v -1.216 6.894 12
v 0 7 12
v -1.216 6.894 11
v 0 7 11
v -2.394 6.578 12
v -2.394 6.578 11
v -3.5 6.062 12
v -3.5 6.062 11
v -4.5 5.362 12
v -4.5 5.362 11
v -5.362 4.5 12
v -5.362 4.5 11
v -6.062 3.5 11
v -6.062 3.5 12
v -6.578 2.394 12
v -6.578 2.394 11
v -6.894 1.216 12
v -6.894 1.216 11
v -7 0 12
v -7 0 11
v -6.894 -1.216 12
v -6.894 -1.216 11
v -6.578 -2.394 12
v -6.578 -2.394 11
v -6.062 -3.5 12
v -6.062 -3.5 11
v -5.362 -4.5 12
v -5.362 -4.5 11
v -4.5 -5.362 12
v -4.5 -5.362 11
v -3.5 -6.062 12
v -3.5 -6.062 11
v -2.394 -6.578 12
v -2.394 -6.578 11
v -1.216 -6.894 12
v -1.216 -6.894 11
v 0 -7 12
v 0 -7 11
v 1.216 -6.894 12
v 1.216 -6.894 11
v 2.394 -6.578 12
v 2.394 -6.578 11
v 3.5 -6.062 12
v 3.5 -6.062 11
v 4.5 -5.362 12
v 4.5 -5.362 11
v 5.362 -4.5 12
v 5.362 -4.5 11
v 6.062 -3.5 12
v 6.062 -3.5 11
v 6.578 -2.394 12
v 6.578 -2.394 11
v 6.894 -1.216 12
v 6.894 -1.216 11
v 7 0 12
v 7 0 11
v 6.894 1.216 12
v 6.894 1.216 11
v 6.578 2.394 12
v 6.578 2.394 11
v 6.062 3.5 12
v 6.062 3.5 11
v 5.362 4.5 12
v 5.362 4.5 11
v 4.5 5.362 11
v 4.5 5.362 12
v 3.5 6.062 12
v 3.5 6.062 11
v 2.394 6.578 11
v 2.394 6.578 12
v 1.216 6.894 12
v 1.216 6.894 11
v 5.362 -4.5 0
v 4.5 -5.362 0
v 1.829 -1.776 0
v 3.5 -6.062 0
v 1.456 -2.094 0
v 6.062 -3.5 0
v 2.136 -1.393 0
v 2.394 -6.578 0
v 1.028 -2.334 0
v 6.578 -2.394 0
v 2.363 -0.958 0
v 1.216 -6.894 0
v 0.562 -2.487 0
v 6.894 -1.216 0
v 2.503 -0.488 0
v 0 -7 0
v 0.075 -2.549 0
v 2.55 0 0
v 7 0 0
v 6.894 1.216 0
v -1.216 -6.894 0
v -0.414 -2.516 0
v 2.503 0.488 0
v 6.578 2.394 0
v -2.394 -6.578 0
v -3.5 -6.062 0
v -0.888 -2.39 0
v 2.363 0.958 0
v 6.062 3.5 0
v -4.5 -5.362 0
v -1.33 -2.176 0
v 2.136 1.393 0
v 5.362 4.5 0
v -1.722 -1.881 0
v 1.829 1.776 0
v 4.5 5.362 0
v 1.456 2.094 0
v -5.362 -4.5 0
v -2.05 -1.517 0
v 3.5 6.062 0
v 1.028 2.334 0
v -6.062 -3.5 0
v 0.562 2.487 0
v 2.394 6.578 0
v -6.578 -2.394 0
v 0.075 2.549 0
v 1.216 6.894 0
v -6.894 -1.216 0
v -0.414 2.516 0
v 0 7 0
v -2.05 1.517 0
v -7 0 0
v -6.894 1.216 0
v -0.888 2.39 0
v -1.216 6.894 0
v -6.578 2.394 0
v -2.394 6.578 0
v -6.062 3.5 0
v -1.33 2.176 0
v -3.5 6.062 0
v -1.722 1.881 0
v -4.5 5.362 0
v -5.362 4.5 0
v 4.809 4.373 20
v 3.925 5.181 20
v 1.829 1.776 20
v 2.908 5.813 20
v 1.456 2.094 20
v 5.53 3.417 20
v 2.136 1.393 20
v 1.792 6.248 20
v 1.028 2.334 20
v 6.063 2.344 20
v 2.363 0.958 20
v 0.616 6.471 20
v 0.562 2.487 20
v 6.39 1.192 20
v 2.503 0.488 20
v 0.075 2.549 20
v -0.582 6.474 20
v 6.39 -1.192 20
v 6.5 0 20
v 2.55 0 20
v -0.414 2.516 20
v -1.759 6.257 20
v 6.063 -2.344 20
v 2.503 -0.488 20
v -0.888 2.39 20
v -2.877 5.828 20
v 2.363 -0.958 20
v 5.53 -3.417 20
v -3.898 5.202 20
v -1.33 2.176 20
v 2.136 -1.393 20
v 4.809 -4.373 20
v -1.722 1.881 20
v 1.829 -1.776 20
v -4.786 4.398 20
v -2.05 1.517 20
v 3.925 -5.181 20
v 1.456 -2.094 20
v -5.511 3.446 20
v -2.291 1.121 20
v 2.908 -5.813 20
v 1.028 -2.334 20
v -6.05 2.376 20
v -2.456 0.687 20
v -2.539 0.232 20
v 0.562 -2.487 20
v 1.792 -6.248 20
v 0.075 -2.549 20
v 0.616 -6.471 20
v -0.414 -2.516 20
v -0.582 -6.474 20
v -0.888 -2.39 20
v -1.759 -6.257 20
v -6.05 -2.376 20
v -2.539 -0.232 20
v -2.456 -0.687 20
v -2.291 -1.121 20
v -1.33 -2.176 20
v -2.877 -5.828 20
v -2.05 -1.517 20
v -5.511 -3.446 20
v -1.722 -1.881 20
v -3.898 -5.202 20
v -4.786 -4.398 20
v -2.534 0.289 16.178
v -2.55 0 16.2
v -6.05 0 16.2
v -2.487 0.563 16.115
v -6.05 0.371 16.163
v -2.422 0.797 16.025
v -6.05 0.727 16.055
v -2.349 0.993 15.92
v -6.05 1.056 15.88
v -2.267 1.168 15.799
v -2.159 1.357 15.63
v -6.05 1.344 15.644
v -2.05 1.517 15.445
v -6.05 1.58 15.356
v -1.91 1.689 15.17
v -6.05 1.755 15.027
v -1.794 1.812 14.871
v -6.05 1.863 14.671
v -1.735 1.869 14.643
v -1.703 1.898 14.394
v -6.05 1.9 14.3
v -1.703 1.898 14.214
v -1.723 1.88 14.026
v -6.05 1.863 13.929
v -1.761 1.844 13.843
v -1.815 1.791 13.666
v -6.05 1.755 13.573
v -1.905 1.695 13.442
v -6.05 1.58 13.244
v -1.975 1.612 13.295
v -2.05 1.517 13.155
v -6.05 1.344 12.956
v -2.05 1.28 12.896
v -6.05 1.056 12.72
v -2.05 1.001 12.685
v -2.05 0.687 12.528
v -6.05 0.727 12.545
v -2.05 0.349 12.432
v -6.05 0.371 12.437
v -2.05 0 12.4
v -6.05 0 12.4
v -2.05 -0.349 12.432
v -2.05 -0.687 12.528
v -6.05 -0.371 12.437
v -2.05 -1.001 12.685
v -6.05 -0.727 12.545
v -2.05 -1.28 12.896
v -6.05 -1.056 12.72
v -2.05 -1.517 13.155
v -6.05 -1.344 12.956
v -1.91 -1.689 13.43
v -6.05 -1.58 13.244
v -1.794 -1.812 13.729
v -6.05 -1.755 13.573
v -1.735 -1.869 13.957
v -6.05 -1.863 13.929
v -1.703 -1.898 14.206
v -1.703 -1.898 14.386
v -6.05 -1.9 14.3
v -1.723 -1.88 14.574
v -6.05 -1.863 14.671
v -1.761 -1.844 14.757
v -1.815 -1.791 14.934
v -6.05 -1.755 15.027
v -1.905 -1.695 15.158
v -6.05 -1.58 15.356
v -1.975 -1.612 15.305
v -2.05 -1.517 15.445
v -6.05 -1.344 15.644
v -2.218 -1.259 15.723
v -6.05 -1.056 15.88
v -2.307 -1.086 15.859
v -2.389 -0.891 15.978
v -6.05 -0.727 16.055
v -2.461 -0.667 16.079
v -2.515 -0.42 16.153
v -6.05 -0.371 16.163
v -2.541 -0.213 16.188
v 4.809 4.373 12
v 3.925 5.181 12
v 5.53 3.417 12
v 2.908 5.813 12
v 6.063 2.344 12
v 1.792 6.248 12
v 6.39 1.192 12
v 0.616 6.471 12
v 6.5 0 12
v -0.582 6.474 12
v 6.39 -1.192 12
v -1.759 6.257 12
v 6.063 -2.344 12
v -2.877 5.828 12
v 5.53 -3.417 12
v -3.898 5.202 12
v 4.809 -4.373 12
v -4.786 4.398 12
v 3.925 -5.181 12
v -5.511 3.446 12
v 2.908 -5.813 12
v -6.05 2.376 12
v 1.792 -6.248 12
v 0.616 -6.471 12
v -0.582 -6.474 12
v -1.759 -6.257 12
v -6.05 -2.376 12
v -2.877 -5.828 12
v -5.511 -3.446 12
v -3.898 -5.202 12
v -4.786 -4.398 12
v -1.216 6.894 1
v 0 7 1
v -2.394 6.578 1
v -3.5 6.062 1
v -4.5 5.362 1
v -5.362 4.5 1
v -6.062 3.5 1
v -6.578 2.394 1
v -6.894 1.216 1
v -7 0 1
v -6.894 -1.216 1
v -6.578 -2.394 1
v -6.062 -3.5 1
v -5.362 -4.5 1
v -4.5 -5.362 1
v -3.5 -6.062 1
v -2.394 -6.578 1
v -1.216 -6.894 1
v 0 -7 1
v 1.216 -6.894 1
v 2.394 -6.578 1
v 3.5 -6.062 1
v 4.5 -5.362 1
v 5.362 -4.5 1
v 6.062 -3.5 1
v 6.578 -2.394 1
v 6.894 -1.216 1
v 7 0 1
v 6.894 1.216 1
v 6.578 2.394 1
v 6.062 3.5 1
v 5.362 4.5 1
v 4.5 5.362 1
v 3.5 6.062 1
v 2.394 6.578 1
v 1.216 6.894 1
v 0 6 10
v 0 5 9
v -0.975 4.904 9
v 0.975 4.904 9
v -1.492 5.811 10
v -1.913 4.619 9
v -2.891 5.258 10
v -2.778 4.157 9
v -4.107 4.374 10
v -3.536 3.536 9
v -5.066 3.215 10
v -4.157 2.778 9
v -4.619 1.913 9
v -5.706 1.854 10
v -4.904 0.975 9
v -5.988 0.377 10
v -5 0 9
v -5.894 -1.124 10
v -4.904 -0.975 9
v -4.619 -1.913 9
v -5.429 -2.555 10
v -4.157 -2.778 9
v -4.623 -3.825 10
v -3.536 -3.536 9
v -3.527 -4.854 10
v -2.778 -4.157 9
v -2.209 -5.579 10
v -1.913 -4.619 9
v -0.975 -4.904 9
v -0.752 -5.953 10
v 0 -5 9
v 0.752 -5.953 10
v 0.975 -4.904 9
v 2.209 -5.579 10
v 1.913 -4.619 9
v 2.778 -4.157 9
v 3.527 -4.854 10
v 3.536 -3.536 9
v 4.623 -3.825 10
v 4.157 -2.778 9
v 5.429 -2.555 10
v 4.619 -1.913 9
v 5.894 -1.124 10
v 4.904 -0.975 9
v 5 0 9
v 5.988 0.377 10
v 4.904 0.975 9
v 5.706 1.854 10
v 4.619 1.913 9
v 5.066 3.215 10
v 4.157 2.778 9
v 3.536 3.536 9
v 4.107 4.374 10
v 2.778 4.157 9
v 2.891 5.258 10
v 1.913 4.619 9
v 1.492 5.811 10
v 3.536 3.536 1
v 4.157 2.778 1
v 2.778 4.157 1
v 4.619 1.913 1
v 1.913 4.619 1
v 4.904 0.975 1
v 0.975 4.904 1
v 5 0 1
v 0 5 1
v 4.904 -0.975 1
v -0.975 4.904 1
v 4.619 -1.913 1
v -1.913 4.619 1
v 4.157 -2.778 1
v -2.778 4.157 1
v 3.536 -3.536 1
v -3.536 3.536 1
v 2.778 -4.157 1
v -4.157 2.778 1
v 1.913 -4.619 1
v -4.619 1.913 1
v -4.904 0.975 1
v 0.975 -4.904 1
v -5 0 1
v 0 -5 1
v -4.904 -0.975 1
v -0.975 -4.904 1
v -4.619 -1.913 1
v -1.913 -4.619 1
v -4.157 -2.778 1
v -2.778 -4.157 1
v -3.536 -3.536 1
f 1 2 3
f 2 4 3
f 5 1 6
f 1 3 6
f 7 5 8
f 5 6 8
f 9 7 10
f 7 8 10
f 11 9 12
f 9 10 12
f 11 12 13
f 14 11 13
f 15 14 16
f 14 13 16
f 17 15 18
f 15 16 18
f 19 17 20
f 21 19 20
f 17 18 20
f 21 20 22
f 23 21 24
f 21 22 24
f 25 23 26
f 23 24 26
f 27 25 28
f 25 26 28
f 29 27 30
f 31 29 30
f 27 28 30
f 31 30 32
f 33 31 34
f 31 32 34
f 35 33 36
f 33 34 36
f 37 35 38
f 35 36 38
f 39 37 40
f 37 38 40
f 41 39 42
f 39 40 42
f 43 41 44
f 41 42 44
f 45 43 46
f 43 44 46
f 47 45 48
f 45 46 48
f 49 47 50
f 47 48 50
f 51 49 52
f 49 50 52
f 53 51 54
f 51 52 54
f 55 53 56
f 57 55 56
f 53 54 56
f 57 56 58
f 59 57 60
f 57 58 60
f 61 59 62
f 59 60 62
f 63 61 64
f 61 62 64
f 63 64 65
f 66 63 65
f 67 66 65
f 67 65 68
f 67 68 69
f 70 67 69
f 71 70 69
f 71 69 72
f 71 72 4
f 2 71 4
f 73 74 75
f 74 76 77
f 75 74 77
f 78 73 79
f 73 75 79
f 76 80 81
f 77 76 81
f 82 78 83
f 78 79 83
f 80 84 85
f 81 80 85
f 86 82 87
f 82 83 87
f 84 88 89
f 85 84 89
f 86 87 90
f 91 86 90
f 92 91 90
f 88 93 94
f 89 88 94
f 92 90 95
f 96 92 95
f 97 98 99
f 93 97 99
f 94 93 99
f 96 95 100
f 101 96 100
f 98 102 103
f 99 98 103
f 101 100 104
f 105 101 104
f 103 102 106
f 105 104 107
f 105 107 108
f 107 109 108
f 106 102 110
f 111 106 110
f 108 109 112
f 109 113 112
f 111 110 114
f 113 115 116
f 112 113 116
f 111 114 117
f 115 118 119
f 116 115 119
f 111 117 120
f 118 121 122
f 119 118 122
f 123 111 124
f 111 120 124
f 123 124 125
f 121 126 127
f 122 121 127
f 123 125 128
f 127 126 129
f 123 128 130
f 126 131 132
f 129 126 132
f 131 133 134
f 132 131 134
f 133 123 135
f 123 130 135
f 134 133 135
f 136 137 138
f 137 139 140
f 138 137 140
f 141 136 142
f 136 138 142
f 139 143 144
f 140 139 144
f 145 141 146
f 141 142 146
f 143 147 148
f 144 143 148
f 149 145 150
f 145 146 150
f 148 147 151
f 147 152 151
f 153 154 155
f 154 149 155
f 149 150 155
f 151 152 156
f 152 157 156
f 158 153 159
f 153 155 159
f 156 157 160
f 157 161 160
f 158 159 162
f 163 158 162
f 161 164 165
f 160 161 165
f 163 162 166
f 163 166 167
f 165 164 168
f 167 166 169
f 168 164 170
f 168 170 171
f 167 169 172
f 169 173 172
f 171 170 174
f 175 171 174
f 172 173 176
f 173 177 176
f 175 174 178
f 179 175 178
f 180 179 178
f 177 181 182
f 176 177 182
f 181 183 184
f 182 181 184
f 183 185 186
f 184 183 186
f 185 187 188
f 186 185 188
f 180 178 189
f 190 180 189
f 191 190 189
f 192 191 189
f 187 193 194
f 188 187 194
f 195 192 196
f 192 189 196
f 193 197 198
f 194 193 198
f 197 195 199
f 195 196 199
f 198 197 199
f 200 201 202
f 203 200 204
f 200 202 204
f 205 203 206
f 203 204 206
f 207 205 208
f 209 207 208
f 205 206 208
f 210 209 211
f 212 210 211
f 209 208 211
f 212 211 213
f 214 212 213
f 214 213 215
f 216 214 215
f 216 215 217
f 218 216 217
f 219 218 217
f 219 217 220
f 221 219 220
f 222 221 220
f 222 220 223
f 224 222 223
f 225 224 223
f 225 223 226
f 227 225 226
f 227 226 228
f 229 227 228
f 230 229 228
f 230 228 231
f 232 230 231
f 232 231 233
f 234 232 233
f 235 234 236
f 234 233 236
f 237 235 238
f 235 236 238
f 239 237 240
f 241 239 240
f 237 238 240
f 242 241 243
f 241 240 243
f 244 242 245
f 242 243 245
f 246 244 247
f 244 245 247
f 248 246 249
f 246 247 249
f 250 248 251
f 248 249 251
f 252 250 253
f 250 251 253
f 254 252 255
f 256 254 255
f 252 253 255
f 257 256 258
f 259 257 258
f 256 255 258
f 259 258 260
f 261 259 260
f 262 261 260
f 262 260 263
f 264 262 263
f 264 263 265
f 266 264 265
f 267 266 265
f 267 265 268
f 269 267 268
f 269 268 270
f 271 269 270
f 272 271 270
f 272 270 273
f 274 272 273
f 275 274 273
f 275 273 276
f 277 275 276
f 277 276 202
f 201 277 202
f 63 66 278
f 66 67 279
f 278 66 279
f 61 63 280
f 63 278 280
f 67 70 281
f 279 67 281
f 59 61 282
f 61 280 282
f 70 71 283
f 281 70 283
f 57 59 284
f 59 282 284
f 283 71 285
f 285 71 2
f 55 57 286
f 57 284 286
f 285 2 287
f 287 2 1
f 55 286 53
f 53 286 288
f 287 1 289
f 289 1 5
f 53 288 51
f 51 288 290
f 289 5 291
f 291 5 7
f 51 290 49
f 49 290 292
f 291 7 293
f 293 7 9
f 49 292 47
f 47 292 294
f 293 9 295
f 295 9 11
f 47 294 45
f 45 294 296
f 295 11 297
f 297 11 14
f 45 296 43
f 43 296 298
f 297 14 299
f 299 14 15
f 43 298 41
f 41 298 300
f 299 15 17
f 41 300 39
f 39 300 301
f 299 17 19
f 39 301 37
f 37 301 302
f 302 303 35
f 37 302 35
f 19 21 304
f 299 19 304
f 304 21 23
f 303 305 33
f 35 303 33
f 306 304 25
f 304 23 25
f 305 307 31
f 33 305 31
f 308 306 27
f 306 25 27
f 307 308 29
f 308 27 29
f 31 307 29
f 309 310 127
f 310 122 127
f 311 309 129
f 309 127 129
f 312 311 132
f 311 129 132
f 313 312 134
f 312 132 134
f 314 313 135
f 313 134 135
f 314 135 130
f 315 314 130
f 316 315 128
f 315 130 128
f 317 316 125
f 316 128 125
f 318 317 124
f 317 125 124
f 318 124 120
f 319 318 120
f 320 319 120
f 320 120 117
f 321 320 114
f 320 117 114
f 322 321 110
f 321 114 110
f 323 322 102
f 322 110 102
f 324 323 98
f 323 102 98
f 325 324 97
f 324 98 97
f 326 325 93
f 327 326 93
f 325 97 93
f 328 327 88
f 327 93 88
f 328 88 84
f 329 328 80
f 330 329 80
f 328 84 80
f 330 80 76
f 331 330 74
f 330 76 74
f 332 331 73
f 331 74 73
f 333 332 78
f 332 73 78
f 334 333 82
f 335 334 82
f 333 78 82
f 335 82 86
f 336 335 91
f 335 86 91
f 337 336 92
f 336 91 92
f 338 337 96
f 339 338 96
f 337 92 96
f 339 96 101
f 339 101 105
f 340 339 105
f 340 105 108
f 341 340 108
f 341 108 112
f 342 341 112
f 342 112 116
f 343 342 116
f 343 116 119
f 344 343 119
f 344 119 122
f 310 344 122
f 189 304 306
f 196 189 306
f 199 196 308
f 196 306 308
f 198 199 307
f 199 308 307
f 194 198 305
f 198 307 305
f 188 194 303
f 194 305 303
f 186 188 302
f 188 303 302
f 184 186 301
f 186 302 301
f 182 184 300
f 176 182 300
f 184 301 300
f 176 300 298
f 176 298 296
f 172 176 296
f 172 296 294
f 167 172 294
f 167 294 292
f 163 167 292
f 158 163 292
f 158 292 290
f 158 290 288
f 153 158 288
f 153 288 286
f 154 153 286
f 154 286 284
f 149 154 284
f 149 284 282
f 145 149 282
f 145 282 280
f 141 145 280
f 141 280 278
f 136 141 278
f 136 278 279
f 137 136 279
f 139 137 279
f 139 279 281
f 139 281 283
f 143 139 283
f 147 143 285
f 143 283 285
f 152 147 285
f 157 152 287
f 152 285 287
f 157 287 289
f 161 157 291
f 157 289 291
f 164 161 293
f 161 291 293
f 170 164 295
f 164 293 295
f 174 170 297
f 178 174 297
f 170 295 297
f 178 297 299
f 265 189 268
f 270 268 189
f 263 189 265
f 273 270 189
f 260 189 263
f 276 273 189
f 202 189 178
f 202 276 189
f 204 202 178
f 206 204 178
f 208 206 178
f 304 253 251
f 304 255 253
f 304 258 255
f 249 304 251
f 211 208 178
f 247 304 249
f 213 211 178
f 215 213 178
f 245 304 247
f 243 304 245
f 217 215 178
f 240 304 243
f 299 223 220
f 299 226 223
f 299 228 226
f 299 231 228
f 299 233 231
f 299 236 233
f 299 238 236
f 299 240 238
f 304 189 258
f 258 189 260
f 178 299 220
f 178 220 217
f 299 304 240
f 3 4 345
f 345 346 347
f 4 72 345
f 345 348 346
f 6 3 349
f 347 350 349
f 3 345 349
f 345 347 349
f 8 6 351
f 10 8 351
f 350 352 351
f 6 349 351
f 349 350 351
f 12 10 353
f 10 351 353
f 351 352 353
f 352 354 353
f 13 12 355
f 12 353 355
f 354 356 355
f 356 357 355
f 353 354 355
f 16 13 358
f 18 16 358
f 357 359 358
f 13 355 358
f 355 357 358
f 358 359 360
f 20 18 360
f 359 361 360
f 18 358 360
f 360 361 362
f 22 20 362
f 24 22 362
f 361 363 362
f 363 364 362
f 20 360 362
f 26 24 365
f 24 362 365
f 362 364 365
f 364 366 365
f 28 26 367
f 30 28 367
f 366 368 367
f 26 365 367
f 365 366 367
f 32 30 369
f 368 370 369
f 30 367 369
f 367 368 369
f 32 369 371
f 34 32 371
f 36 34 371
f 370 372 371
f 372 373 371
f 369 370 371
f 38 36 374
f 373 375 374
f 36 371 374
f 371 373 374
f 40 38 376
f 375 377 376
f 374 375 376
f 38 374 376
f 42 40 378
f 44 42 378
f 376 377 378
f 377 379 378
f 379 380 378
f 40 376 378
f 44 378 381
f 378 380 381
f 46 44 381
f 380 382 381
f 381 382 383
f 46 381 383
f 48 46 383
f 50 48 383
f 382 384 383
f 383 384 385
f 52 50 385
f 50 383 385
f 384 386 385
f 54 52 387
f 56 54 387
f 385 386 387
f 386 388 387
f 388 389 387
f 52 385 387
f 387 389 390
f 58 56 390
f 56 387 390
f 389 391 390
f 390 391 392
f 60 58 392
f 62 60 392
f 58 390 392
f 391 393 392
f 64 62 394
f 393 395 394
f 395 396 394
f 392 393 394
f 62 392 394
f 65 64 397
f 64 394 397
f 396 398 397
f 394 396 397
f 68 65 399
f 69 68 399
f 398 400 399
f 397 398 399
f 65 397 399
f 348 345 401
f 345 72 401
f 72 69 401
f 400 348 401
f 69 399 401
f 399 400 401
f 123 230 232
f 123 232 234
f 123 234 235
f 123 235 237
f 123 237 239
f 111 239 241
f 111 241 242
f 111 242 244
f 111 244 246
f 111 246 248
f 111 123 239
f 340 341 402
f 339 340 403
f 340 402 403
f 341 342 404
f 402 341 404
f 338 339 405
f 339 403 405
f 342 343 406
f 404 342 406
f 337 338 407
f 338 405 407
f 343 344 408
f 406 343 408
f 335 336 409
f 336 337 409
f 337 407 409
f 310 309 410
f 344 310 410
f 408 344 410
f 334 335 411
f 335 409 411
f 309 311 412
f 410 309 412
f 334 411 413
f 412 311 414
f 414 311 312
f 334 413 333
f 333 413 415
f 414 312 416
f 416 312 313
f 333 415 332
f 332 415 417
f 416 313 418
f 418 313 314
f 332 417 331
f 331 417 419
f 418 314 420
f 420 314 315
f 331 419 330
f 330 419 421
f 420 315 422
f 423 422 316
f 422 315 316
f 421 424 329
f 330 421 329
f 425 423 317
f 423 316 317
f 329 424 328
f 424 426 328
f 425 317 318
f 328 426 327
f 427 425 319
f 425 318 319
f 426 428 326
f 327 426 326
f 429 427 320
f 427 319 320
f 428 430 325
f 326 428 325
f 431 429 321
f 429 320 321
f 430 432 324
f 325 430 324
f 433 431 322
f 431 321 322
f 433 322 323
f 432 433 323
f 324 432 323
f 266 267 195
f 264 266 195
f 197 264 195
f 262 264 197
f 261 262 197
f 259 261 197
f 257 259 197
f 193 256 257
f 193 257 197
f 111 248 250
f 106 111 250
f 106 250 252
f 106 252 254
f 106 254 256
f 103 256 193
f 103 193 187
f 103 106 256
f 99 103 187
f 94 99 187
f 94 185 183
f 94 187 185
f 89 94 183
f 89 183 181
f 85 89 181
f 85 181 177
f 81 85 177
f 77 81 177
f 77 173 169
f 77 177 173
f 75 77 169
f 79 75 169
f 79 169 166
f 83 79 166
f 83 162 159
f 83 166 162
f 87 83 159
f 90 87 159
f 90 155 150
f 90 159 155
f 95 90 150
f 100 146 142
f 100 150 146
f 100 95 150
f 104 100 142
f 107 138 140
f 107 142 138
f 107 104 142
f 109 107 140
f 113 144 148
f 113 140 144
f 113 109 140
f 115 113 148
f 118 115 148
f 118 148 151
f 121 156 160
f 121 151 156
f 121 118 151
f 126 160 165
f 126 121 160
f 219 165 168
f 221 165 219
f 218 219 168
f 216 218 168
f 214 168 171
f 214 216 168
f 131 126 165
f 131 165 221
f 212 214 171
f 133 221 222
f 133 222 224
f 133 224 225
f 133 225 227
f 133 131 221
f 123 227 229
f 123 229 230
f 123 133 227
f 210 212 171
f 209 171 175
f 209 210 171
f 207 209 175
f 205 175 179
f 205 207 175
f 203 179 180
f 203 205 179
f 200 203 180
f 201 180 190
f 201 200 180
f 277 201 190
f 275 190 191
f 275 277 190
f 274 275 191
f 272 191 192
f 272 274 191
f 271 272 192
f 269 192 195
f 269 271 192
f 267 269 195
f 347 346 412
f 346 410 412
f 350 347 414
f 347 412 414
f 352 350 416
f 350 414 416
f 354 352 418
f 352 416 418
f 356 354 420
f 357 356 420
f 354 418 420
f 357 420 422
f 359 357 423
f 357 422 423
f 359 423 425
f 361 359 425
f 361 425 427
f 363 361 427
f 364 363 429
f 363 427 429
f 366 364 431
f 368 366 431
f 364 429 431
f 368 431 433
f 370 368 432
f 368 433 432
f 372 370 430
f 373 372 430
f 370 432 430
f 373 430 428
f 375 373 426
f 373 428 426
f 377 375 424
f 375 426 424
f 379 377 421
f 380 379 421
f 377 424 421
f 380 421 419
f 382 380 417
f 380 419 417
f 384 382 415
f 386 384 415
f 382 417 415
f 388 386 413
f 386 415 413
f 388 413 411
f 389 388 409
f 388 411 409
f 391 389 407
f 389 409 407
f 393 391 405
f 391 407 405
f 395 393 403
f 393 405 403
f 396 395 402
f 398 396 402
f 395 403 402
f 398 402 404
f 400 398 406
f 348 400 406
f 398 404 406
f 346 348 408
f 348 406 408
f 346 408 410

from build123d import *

# Parameters (mm, degrees)
CUT_EXTRUDE1_DEPTH      = 23.315913604
CUT_EXTRUDE1_DEPTH_BACK = 23.315913604
CUT_EXTRUDE2_START      = -8
CUT_EXTRUDE2_DEPTH      = 8
CUT_EXTRUDE3_REACH      = 26.886
SKETCH4_R               = 1.9
CUT_EXTRUDE4_START      = -5.7
SKETCH5_R               = 2.55
CUT_EXTRUDE4_DEPTH      = 5.7


with BuildPart() as part:
    # Sketch2 → Revolve1 (revolve)
    with BuildSketch(Plane(origin=(0, 0, 0), x_dir=(0, 0, -1), z_dir=(1, 0, 0))):
        Polygon((0, 0), (-20, 0), (-20, 6.5), (-12, 6.5), (-12, 7), (-11, 7), (-9, 5), (-1, 5), (-1, 7), (0, 7), align=None)
    revolve(axis=Axis((0, 0, 0), (0, 0, 1)))

    # Sketch1 → Cut-Extrude1 (cut, two sides: drawn at the far end of the back side and taken through both)
    with BuildSketch(Plane.XY.offset(-CUT_EXTRUDE1_DEPTH_BACK)):
        with BuildLine():
            Line((-2.05, 1.516575089), (-2.05, -1.516575089))
            ThreePointArc((-2.05, -1.516575089), (2.55, 0), (-2.05, 1.516575089))
        make_face()
    extrude(amount=CUT_EXTRUDE1_DEPTH + CUT_EXTRUDE1_DEPTH_BACK, mode=Mode.SUBTRACT)

    # Sketch3 → Cut-Extrude2 (cut)
    with BuildSketch(Plane.XY.offset(20).offset(CUT_EXTRUDE2_START)):
        with BuildLine():
            Line((-6.05, -2.376446928), (-6.05, 2.376446928))
            ThreePointArc((-6.05, 2.376446928), (-6.5, 0), (-6.05, -2.376446928))
        make_face()
    extrude(amount=CUT_EXTRUDE2_DEPTH, mode=Mode.SUBTRACT)

    # Sketch4 → Cut-Extrude3 (cut, up to next)
    with BuildSketch(Plane.ZY.offset(6.05), mode=Mode.PRIVATE) as cut_extrude3_sk1:
        with Locations((14.3, 0)):
            Circle(SKETCH4_R)
    cut_extrude3_tool1 = extrude(cut_extrude3_sk1.sketch, amount=-CUT_EXTRUDE3_REACH, mode=Mode.PRIVATE) & part.part
    add(cut_extrude3_tool1.solids().sort_by_distance((-6.05, 0, 14.3))[0], mode=Mode.SUBTRACT)

    # Sketch5 → Cut-Extrude4 (cut)
    with BuildSketch(Plane.XY.offset(20).offset(CUT_EXTRUDE4_START)):
        with Locations(Location((0, 0, 0), (0, 0, 143.5062334))):
            Circle(SKETCH5_R)
    extrude(amount=CUT_EXTRUDE4_DEPTH, mode=Mode.SUBTRACT)


solid = part.part
